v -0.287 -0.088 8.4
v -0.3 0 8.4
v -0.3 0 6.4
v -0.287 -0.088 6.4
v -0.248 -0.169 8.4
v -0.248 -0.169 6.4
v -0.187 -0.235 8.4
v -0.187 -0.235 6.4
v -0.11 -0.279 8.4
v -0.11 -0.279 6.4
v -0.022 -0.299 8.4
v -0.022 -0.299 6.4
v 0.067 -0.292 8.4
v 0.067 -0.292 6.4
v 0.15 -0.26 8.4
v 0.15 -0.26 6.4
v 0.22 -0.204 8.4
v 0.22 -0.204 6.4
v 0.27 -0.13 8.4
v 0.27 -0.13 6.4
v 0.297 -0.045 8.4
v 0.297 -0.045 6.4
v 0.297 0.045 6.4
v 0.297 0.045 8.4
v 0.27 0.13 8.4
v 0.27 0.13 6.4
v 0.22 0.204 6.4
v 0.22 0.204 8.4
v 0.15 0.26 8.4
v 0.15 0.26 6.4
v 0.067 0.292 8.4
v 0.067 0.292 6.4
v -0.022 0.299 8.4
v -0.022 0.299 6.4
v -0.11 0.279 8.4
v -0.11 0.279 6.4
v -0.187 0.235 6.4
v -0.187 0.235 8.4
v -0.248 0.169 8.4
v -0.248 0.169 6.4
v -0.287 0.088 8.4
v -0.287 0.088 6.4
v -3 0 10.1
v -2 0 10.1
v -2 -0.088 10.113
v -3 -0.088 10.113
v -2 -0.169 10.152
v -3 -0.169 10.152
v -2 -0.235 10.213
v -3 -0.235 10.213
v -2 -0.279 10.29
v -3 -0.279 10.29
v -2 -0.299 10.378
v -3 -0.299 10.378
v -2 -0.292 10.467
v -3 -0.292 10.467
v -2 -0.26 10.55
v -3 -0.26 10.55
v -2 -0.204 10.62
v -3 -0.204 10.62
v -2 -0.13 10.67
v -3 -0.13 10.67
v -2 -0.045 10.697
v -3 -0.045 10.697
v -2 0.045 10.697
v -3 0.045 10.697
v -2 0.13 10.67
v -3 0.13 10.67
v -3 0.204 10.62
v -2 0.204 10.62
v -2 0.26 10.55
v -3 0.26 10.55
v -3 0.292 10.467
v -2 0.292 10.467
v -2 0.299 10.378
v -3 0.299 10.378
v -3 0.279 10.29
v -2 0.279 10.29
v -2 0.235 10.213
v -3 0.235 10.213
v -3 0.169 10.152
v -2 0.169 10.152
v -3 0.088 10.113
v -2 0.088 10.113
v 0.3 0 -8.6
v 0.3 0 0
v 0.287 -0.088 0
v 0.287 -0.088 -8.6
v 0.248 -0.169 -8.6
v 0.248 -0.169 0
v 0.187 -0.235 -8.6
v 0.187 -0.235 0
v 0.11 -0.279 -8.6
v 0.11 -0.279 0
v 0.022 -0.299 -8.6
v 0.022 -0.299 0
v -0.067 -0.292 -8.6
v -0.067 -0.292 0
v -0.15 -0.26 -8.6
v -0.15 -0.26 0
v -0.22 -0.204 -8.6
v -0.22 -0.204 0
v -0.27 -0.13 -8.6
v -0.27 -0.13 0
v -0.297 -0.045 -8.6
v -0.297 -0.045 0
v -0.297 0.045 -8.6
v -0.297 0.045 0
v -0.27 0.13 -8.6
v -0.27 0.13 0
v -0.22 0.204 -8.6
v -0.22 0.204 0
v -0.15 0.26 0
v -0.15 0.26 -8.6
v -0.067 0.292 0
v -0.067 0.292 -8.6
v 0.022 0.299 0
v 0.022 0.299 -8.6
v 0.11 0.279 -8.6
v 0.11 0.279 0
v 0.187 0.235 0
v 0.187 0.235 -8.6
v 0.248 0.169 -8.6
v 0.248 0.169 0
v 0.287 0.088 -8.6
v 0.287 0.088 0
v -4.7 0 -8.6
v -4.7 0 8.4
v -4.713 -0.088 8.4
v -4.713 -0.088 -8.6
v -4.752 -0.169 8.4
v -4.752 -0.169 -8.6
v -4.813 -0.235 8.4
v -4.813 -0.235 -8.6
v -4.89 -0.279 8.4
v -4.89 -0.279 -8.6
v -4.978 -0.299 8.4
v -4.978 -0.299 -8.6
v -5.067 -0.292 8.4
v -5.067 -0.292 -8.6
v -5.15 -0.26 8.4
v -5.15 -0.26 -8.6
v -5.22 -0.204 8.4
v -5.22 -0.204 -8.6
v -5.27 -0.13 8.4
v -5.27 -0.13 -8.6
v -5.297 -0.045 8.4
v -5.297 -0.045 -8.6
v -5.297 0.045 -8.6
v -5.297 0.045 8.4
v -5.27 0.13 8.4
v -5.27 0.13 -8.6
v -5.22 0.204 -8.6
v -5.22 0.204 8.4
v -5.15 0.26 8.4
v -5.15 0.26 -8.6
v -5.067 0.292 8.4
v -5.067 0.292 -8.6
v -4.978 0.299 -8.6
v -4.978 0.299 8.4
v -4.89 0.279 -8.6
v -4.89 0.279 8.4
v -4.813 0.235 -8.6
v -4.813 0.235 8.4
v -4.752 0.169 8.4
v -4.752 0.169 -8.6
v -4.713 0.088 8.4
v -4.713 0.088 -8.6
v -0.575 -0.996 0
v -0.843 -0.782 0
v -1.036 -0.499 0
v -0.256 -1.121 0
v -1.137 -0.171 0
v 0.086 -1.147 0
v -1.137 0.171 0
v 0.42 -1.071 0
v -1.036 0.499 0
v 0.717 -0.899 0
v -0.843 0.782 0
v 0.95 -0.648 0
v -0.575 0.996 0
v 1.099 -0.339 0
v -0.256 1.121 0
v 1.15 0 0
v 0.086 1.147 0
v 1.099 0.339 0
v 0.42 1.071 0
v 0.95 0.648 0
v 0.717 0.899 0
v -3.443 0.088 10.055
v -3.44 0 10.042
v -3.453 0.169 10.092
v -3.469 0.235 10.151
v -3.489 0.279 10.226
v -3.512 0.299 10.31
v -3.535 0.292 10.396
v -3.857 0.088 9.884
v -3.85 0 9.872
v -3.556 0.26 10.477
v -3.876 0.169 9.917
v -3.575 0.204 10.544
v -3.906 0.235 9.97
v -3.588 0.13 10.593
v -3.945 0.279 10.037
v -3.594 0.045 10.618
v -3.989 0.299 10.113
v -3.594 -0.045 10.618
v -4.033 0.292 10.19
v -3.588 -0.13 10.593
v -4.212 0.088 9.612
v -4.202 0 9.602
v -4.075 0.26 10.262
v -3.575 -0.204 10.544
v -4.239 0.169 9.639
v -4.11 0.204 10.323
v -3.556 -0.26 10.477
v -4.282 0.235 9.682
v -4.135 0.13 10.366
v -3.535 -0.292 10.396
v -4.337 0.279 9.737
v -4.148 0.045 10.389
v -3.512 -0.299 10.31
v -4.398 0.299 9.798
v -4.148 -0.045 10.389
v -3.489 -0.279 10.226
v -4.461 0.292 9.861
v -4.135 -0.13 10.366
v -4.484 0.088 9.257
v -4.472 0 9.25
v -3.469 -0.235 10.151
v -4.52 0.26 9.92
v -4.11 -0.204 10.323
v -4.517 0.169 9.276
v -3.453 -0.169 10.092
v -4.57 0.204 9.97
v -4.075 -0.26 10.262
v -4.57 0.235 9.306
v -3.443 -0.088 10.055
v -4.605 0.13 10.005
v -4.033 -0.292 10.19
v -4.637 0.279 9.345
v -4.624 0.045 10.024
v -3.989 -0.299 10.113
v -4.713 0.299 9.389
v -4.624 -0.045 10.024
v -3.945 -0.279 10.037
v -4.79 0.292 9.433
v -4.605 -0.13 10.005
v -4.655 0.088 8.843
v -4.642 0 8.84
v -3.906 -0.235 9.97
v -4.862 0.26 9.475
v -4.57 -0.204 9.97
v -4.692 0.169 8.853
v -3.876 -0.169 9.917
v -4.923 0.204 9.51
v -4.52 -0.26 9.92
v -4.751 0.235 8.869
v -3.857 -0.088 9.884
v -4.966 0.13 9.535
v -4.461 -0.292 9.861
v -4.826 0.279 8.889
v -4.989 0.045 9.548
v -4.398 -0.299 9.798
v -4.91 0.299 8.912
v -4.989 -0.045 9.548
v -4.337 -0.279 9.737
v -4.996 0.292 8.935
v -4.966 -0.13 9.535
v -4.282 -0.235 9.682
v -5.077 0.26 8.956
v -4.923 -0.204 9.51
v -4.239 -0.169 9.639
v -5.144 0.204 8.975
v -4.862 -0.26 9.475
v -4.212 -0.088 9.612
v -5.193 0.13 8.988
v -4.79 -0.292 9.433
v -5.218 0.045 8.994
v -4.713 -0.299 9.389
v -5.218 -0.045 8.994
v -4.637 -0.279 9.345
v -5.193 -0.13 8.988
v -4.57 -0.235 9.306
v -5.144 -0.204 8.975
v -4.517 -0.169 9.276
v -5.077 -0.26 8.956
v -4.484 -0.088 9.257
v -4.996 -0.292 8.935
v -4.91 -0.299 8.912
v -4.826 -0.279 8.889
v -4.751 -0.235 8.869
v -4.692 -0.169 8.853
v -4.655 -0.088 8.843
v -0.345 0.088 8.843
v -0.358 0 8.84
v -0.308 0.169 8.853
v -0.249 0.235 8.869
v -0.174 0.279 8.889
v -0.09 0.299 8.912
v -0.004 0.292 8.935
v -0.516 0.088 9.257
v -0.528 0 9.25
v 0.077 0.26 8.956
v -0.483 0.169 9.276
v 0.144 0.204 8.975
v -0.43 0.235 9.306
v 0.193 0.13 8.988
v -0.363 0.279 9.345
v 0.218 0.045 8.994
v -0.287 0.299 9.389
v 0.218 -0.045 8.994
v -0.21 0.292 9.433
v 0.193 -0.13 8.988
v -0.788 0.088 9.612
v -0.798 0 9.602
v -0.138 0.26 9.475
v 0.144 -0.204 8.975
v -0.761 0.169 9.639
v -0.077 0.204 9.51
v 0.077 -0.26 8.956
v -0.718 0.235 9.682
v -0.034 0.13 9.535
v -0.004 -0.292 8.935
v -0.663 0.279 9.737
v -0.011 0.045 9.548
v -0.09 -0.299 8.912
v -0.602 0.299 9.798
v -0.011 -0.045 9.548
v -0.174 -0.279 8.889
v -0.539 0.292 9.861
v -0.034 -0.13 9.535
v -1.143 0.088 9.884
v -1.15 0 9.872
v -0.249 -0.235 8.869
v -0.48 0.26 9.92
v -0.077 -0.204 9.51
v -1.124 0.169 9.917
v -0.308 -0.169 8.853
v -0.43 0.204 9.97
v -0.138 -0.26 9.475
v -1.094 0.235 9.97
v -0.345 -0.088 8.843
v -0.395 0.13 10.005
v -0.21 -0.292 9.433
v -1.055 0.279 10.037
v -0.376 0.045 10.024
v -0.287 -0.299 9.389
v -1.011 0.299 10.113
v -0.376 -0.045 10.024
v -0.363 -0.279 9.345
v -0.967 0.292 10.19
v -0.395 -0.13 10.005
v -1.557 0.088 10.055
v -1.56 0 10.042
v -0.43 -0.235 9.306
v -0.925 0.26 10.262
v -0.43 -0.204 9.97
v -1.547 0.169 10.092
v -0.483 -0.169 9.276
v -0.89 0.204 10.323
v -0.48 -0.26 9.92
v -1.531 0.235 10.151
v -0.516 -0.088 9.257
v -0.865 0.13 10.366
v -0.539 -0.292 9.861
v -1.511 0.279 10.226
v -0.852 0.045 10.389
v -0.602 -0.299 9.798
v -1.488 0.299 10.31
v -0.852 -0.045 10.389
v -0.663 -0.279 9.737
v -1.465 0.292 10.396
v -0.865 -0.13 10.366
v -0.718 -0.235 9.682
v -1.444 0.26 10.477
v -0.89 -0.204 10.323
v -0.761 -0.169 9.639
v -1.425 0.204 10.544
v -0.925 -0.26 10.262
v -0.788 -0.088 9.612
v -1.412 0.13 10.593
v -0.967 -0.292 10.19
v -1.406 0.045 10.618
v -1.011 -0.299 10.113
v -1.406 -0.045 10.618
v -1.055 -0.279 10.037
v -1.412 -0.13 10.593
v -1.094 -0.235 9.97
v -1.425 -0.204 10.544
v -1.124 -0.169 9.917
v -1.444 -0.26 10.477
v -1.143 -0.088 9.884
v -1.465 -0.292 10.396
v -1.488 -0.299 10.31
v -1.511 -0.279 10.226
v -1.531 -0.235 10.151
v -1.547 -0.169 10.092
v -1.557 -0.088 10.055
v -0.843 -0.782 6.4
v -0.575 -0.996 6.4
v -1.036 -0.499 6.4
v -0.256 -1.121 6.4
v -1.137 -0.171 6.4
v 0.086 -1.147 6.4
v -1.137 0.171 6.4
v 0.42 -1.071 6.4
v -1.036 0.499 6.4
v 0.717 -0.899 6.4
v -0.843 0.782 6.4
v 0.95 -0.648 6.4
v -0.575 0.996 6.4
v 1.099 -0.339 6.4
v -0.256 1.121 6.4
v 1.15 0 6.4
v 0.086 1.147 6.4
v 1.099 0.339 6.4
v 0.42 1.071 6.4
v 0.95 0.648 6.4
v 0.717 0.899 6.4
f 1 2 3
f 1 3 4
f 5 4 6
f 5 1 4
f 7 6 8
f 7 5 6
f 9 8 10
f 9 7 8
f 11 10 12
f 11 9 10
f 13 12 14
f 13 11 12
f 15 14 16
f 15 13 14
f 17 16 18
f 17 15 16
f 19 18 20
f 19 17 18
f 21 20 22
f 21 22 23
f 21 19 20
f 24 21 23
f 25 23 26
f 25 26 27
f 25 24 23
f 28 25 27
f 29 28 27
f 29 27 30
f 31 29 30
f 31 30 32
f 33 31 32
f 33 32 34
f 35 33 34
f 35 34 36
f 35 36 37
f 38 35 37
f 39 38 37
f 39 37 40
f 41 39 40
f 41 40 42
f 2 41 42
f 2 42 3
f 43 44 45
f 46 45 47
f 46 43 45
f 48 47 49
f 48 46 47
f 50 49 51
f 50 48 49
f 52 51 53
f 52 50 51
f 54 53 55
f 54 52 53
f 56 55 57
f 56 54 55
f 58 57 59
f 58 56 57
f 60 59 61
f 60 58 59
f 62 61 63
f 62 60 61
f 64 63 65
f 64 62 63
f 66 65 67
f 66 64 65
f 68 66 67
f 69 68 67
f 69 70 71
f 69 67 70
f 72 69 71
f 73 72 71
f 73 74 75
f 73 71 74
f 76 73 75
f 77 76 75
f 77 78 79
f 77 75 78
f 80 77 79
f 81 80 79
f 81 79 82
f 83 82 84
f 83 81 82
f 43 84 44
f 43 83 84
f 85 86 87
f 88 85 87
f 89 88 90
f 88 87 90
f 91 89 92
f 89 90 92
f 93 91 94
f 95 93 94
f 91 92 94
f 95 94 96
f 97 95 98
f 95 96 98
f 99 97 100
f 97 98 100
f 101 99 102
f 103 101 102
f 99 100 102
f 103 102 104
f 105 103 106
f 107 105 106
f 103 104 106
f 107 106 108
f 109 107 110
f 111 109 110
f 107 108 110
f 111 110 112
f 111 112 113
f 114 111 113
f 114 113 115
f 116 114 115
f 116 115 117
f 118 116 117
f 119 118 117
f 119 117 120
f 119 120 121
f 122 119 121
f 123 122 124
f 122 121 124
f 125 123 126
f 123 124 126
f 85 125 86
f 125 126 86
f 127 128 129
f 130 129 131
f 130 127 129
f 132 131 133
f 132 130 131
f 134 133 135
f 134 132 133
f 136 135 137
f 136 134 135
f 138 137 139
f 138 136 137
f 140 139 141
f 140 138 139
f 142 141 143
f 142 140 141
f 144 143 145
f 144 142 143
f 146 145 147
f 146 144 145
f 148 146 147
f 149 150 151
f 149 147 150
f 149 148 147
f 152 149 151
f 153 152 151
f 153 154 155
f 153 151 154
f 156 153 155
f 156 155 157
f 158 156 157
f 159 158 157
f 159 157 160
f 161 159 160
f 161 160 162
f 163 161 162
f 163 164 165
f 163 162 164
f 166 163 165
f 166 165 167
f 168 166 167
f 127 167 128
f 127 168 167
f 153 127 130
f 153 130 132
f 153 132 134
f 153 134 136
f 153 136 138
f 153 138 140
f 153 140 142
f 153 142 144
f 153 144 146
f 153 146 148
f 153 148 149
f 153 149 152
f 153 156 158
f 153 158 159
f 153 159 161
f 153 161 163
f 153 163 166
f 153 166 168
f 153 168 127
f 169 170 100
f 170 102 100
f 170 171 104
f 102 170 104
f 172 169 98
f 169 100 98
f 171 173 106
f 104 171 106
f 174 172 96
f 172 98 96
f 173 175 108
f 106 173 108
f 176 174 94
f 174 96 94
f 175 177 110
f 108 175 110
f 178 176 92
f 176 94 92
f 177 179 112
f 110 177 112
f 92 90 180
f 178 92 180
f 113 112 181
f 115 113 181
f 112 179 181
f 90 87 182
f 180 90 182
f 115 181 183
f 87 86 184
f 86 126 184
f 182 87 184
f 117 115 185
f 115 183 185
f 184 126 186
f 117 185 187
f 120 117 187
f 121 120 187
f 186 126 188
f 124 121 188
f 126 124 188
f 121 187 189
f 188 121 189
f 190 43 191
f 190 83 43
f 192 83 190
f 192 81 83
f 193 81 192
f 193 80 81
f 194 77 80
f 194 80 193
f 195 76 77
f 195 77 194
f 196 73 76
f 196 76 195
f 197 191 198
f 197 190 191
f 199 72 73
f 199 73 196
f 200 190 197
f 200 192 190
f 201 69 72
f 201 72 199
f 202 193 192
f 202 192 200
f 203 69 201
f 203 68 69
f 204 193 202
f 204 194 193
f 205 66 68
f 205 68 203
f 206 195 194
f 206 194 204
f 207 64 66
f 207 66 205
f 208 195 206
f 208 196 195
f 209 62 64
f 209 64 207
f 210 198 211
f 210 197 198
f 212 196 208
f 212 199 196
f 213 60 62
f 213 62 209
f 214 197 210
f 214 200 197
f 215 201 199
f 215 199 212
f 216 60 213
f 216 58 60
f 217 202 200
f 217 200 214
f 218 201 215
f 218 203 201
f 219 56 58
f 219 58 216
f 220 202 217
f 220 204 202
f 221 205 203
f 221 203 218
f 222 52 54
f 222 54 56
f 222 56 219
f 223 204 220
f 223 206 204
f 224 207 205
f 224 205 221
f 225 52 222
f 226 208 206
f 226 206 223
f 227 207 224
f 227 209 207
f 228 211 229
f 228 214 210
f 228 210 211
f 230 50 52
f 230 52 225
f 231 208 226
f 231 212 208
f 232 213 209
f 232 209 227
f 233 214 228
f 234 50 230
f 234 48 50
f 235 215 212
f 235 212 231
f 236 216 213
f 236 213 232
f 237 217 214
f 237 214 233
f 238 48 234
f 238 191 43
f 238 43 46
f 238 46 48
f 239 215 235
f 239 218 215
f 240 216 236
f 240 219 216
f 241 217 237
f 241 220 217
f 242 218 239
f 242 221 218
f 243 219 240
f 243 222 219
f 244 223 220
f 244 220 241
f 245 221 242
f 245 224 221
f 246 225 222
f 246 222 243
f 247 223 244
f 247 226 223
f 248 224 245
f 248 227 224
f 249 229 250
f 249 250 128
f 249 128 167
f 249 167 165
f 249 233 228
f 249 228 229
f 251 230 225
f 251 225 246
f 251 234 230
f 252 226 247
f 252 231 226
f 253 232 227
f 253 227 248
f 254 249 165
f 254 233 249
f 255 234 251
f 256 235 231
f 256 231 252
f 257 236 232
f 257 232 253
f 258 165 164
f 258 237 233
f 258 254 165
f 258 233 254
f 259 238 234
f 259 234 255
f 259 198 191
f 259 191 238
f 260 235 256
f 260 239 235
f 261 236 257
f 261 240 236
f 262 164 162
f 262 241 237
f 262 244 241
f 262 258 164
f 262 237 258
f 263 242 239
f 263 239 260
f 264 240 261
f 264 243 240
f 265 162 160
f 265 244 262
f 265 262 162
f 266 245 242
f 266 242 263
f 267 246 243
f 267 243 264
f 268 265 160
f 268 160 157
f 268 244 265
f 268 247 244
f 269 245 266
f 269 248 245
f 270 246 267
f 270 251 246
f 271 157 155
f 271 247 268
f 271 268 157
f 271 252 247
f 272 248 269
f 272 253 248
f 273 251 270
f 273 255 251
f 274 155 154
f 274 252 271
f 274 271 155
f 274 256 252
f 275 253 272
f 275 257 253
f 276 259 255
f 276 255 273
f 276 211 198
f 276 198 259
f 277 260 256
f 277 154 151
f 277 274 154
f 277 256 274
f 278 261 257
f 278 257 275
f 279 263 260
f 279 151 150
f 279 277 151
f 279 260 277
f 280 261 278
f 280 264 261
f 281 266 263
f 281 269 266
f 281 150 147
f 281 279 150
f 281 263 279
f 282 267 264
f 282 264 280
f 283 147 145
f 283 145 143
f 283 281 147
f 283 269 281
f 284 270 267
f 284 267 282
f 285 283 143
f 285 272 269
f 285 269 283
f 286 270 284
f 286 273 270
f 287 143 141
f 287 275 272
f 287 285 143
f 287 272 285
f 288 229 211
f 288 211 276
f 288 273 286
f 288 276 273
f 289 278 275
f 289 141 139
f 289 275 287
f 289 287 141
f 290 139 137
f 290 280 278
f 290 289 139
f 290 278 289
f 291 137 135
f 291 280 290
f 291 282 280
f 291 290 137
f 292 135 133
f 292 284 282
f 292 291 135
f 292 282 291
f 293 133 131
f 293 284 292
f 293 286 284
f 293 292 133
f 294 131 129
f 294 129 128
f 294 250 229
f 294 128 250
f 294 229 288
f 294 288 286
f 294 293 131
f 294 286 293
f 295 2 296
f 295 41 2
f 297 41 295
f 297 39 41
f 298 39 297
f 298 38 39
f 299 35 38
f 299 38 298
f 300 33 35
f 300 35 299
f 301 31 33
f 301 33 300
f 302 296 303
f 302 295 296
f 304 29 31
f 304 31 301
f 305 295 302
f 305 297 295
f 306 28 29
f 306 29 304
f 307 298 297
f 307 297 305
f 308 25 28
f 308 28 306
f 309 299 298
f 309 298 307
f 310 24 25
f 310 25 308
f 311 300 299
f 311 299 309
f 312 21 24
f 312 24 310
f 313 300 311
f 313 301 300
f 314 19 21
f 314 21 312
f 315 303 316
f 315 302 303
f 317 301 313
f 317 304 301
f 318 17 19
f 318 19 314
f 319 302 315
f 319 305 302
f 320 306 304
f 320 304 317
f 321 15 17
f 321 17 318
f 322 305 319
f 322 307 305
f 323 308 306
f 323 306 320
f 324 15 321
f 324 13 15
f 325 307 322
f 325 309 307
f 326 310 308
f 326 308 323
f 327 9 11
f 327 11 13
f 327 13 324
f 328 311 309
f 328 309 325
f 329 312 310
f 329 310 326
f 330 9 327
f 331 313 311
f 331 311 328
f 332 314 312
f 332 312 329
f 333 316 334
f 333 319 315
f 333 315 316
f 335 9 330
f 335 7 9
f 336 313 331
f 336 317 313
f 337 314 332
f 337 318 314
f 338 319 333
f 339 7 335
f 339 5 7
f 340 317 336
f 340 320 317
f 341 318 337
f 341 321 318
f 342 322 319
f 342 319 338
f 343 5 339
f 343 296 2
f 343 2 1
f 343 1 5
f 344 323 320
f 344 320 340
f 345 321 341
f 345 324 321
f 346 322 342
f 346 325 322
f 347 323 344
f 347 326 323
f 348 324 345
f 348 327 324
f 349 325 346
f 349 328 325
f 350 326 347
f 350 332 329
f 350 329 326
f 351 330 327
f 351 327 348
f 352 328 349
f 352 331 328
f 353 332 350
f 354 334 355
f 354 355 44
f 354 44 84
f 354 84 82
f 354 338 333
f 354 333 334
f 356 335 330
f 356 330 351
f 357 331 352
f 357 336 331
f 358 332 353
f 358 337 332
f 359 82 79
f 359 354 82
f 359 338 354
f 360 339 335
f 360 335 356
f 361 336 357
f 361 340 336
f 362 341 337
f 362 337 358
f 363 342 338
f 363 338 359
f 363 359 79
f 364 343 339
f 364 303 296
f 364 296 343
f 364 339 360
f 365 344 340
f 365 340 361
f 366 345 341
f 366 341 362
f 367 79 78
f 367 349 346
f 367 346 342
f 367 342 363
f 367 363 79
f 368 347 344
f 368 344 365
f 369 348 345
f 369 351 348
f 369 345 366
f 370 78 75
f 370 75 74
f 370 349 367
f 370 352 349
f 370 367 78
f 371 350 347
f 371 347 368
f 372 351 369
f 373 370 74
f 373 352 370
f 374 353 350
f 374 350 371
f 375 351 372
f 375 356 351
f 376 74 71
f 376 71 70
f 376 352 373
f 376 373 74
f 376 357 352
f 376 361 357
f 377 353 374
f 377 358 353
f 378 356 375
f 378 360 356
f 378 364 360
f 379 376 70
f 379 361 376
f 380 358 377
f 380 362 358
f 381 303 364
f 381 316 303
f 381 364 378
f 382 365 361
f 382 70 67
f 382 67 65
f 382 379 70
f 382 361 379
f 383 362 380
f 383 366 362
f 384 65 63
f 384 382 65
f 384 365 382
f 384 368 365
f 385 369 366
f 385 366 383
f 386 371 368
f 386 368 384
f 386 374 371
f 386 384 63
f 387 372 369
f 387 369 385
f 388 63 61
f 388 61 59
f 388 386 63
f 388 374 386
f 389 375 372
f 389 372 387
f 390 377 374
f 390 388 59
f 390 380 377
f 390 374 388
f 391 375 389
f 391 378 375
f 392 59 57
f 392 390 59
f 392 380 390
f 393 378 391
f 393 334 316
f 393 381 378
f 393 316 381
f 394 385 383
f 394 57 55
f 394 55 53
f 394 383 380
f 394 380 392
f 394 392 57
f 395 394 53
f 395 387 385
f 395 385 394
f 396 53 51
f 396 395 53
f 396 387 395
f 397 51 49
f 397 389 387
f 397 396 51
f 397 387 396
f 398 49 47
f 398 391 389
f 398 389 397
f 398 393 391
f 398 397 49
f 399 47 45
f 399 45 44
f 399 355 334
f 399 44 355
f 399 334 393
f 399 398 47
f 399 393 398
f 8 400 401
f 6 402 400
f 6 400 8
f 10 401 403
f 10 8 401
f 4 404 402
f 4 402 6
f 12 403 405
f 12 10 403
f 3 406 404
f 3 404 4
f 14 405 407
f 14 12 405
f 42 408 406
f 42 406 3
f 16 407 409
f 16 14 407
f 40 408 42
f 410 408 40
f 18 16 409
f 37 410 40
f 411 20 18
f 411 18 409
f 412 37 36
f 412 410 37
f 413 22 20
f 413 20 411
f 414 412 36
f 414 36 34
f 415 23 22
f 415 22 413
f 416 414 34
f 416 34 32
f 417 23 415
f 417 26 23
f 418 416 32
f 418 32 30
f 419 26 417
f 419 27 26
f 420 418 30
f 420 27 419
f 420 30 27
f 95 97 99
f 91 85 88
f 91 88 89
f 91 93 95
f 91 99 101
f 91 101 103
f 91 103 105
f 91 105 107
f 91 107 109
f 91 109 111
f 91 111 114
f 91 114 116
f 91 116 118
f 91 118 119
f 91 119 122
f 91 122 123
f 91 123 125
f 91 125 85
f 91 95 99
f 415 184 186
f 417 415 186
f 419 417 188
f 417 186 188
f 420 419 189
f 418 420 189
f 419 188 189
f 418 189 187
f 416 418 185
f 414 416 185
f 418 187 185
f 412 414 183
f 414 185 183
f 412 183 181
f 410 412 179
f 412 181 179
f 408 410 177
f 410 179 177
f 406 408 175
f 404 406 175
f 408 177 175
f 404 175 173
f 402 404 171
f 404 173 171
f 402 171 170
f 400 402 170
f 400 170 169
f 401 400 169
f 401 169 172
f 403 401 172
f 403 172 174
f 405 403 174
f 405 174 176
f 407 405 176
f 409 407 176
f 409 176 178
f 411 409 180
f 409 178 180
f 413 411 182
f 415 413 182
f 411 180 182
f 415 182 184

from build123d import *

# Parameters (mm, degrees)
SKETCH2_R           = 1.15
RESISTOR_BODY_DEPTH = 6.4
LEAD1_PROFILE_R     = 0.3
SKETCH6_R           = 0.3
LEAD2_DEPTH         = 8.6


with BuildPart() as part:
    # Sketch2 → Resistor Body (new body)
    with BuildSketch(Plane.XY):
        Circle(SKETCH2_R)
    extrude(amount=RESISTOR_BODY_DEPTH)

    # Lead1: sweep along a path in Lead1 Path
    with BuildLine(Plane(origin=(0, 0, 0), x_dir=(-1, 0, 0), z_dir=(0, -1, 0))) as lead1_path:
        Line((0, -6.4), (0, -8.4))
        ThreePointArc((0, -8.4), (0.585786438, -9.814213562), (2, -10.4))
        Line((2, -10.4), (3, -10.4))
        ThreePointArc((3, -10.4), (4.414213562, -9.814213562), (5, -8.4))
        Line((5, -8.4), (5, 8.6))
    # Lead1 Profile → Lead1 (sweep)
    with BuildSketch(Plane(origin=(0, 0, 6.4), x_dir=(-1, 0, 0), z_dir=(0, 0, 1))):
        Circle(LEAD1_PROFILE_R)
    sweep(path=lead1_path.line)

    # Sketch6 → Lead2 (add)
    with BuildSketch(Plane(origin=(0, 0, 0), x_dir=(1, 0, 0), z_dir=(0, 0, -1))):
        Circle(SKETCH6_R)
    extrude(amount=LEAD2_DEPTH)


solid = part.part
